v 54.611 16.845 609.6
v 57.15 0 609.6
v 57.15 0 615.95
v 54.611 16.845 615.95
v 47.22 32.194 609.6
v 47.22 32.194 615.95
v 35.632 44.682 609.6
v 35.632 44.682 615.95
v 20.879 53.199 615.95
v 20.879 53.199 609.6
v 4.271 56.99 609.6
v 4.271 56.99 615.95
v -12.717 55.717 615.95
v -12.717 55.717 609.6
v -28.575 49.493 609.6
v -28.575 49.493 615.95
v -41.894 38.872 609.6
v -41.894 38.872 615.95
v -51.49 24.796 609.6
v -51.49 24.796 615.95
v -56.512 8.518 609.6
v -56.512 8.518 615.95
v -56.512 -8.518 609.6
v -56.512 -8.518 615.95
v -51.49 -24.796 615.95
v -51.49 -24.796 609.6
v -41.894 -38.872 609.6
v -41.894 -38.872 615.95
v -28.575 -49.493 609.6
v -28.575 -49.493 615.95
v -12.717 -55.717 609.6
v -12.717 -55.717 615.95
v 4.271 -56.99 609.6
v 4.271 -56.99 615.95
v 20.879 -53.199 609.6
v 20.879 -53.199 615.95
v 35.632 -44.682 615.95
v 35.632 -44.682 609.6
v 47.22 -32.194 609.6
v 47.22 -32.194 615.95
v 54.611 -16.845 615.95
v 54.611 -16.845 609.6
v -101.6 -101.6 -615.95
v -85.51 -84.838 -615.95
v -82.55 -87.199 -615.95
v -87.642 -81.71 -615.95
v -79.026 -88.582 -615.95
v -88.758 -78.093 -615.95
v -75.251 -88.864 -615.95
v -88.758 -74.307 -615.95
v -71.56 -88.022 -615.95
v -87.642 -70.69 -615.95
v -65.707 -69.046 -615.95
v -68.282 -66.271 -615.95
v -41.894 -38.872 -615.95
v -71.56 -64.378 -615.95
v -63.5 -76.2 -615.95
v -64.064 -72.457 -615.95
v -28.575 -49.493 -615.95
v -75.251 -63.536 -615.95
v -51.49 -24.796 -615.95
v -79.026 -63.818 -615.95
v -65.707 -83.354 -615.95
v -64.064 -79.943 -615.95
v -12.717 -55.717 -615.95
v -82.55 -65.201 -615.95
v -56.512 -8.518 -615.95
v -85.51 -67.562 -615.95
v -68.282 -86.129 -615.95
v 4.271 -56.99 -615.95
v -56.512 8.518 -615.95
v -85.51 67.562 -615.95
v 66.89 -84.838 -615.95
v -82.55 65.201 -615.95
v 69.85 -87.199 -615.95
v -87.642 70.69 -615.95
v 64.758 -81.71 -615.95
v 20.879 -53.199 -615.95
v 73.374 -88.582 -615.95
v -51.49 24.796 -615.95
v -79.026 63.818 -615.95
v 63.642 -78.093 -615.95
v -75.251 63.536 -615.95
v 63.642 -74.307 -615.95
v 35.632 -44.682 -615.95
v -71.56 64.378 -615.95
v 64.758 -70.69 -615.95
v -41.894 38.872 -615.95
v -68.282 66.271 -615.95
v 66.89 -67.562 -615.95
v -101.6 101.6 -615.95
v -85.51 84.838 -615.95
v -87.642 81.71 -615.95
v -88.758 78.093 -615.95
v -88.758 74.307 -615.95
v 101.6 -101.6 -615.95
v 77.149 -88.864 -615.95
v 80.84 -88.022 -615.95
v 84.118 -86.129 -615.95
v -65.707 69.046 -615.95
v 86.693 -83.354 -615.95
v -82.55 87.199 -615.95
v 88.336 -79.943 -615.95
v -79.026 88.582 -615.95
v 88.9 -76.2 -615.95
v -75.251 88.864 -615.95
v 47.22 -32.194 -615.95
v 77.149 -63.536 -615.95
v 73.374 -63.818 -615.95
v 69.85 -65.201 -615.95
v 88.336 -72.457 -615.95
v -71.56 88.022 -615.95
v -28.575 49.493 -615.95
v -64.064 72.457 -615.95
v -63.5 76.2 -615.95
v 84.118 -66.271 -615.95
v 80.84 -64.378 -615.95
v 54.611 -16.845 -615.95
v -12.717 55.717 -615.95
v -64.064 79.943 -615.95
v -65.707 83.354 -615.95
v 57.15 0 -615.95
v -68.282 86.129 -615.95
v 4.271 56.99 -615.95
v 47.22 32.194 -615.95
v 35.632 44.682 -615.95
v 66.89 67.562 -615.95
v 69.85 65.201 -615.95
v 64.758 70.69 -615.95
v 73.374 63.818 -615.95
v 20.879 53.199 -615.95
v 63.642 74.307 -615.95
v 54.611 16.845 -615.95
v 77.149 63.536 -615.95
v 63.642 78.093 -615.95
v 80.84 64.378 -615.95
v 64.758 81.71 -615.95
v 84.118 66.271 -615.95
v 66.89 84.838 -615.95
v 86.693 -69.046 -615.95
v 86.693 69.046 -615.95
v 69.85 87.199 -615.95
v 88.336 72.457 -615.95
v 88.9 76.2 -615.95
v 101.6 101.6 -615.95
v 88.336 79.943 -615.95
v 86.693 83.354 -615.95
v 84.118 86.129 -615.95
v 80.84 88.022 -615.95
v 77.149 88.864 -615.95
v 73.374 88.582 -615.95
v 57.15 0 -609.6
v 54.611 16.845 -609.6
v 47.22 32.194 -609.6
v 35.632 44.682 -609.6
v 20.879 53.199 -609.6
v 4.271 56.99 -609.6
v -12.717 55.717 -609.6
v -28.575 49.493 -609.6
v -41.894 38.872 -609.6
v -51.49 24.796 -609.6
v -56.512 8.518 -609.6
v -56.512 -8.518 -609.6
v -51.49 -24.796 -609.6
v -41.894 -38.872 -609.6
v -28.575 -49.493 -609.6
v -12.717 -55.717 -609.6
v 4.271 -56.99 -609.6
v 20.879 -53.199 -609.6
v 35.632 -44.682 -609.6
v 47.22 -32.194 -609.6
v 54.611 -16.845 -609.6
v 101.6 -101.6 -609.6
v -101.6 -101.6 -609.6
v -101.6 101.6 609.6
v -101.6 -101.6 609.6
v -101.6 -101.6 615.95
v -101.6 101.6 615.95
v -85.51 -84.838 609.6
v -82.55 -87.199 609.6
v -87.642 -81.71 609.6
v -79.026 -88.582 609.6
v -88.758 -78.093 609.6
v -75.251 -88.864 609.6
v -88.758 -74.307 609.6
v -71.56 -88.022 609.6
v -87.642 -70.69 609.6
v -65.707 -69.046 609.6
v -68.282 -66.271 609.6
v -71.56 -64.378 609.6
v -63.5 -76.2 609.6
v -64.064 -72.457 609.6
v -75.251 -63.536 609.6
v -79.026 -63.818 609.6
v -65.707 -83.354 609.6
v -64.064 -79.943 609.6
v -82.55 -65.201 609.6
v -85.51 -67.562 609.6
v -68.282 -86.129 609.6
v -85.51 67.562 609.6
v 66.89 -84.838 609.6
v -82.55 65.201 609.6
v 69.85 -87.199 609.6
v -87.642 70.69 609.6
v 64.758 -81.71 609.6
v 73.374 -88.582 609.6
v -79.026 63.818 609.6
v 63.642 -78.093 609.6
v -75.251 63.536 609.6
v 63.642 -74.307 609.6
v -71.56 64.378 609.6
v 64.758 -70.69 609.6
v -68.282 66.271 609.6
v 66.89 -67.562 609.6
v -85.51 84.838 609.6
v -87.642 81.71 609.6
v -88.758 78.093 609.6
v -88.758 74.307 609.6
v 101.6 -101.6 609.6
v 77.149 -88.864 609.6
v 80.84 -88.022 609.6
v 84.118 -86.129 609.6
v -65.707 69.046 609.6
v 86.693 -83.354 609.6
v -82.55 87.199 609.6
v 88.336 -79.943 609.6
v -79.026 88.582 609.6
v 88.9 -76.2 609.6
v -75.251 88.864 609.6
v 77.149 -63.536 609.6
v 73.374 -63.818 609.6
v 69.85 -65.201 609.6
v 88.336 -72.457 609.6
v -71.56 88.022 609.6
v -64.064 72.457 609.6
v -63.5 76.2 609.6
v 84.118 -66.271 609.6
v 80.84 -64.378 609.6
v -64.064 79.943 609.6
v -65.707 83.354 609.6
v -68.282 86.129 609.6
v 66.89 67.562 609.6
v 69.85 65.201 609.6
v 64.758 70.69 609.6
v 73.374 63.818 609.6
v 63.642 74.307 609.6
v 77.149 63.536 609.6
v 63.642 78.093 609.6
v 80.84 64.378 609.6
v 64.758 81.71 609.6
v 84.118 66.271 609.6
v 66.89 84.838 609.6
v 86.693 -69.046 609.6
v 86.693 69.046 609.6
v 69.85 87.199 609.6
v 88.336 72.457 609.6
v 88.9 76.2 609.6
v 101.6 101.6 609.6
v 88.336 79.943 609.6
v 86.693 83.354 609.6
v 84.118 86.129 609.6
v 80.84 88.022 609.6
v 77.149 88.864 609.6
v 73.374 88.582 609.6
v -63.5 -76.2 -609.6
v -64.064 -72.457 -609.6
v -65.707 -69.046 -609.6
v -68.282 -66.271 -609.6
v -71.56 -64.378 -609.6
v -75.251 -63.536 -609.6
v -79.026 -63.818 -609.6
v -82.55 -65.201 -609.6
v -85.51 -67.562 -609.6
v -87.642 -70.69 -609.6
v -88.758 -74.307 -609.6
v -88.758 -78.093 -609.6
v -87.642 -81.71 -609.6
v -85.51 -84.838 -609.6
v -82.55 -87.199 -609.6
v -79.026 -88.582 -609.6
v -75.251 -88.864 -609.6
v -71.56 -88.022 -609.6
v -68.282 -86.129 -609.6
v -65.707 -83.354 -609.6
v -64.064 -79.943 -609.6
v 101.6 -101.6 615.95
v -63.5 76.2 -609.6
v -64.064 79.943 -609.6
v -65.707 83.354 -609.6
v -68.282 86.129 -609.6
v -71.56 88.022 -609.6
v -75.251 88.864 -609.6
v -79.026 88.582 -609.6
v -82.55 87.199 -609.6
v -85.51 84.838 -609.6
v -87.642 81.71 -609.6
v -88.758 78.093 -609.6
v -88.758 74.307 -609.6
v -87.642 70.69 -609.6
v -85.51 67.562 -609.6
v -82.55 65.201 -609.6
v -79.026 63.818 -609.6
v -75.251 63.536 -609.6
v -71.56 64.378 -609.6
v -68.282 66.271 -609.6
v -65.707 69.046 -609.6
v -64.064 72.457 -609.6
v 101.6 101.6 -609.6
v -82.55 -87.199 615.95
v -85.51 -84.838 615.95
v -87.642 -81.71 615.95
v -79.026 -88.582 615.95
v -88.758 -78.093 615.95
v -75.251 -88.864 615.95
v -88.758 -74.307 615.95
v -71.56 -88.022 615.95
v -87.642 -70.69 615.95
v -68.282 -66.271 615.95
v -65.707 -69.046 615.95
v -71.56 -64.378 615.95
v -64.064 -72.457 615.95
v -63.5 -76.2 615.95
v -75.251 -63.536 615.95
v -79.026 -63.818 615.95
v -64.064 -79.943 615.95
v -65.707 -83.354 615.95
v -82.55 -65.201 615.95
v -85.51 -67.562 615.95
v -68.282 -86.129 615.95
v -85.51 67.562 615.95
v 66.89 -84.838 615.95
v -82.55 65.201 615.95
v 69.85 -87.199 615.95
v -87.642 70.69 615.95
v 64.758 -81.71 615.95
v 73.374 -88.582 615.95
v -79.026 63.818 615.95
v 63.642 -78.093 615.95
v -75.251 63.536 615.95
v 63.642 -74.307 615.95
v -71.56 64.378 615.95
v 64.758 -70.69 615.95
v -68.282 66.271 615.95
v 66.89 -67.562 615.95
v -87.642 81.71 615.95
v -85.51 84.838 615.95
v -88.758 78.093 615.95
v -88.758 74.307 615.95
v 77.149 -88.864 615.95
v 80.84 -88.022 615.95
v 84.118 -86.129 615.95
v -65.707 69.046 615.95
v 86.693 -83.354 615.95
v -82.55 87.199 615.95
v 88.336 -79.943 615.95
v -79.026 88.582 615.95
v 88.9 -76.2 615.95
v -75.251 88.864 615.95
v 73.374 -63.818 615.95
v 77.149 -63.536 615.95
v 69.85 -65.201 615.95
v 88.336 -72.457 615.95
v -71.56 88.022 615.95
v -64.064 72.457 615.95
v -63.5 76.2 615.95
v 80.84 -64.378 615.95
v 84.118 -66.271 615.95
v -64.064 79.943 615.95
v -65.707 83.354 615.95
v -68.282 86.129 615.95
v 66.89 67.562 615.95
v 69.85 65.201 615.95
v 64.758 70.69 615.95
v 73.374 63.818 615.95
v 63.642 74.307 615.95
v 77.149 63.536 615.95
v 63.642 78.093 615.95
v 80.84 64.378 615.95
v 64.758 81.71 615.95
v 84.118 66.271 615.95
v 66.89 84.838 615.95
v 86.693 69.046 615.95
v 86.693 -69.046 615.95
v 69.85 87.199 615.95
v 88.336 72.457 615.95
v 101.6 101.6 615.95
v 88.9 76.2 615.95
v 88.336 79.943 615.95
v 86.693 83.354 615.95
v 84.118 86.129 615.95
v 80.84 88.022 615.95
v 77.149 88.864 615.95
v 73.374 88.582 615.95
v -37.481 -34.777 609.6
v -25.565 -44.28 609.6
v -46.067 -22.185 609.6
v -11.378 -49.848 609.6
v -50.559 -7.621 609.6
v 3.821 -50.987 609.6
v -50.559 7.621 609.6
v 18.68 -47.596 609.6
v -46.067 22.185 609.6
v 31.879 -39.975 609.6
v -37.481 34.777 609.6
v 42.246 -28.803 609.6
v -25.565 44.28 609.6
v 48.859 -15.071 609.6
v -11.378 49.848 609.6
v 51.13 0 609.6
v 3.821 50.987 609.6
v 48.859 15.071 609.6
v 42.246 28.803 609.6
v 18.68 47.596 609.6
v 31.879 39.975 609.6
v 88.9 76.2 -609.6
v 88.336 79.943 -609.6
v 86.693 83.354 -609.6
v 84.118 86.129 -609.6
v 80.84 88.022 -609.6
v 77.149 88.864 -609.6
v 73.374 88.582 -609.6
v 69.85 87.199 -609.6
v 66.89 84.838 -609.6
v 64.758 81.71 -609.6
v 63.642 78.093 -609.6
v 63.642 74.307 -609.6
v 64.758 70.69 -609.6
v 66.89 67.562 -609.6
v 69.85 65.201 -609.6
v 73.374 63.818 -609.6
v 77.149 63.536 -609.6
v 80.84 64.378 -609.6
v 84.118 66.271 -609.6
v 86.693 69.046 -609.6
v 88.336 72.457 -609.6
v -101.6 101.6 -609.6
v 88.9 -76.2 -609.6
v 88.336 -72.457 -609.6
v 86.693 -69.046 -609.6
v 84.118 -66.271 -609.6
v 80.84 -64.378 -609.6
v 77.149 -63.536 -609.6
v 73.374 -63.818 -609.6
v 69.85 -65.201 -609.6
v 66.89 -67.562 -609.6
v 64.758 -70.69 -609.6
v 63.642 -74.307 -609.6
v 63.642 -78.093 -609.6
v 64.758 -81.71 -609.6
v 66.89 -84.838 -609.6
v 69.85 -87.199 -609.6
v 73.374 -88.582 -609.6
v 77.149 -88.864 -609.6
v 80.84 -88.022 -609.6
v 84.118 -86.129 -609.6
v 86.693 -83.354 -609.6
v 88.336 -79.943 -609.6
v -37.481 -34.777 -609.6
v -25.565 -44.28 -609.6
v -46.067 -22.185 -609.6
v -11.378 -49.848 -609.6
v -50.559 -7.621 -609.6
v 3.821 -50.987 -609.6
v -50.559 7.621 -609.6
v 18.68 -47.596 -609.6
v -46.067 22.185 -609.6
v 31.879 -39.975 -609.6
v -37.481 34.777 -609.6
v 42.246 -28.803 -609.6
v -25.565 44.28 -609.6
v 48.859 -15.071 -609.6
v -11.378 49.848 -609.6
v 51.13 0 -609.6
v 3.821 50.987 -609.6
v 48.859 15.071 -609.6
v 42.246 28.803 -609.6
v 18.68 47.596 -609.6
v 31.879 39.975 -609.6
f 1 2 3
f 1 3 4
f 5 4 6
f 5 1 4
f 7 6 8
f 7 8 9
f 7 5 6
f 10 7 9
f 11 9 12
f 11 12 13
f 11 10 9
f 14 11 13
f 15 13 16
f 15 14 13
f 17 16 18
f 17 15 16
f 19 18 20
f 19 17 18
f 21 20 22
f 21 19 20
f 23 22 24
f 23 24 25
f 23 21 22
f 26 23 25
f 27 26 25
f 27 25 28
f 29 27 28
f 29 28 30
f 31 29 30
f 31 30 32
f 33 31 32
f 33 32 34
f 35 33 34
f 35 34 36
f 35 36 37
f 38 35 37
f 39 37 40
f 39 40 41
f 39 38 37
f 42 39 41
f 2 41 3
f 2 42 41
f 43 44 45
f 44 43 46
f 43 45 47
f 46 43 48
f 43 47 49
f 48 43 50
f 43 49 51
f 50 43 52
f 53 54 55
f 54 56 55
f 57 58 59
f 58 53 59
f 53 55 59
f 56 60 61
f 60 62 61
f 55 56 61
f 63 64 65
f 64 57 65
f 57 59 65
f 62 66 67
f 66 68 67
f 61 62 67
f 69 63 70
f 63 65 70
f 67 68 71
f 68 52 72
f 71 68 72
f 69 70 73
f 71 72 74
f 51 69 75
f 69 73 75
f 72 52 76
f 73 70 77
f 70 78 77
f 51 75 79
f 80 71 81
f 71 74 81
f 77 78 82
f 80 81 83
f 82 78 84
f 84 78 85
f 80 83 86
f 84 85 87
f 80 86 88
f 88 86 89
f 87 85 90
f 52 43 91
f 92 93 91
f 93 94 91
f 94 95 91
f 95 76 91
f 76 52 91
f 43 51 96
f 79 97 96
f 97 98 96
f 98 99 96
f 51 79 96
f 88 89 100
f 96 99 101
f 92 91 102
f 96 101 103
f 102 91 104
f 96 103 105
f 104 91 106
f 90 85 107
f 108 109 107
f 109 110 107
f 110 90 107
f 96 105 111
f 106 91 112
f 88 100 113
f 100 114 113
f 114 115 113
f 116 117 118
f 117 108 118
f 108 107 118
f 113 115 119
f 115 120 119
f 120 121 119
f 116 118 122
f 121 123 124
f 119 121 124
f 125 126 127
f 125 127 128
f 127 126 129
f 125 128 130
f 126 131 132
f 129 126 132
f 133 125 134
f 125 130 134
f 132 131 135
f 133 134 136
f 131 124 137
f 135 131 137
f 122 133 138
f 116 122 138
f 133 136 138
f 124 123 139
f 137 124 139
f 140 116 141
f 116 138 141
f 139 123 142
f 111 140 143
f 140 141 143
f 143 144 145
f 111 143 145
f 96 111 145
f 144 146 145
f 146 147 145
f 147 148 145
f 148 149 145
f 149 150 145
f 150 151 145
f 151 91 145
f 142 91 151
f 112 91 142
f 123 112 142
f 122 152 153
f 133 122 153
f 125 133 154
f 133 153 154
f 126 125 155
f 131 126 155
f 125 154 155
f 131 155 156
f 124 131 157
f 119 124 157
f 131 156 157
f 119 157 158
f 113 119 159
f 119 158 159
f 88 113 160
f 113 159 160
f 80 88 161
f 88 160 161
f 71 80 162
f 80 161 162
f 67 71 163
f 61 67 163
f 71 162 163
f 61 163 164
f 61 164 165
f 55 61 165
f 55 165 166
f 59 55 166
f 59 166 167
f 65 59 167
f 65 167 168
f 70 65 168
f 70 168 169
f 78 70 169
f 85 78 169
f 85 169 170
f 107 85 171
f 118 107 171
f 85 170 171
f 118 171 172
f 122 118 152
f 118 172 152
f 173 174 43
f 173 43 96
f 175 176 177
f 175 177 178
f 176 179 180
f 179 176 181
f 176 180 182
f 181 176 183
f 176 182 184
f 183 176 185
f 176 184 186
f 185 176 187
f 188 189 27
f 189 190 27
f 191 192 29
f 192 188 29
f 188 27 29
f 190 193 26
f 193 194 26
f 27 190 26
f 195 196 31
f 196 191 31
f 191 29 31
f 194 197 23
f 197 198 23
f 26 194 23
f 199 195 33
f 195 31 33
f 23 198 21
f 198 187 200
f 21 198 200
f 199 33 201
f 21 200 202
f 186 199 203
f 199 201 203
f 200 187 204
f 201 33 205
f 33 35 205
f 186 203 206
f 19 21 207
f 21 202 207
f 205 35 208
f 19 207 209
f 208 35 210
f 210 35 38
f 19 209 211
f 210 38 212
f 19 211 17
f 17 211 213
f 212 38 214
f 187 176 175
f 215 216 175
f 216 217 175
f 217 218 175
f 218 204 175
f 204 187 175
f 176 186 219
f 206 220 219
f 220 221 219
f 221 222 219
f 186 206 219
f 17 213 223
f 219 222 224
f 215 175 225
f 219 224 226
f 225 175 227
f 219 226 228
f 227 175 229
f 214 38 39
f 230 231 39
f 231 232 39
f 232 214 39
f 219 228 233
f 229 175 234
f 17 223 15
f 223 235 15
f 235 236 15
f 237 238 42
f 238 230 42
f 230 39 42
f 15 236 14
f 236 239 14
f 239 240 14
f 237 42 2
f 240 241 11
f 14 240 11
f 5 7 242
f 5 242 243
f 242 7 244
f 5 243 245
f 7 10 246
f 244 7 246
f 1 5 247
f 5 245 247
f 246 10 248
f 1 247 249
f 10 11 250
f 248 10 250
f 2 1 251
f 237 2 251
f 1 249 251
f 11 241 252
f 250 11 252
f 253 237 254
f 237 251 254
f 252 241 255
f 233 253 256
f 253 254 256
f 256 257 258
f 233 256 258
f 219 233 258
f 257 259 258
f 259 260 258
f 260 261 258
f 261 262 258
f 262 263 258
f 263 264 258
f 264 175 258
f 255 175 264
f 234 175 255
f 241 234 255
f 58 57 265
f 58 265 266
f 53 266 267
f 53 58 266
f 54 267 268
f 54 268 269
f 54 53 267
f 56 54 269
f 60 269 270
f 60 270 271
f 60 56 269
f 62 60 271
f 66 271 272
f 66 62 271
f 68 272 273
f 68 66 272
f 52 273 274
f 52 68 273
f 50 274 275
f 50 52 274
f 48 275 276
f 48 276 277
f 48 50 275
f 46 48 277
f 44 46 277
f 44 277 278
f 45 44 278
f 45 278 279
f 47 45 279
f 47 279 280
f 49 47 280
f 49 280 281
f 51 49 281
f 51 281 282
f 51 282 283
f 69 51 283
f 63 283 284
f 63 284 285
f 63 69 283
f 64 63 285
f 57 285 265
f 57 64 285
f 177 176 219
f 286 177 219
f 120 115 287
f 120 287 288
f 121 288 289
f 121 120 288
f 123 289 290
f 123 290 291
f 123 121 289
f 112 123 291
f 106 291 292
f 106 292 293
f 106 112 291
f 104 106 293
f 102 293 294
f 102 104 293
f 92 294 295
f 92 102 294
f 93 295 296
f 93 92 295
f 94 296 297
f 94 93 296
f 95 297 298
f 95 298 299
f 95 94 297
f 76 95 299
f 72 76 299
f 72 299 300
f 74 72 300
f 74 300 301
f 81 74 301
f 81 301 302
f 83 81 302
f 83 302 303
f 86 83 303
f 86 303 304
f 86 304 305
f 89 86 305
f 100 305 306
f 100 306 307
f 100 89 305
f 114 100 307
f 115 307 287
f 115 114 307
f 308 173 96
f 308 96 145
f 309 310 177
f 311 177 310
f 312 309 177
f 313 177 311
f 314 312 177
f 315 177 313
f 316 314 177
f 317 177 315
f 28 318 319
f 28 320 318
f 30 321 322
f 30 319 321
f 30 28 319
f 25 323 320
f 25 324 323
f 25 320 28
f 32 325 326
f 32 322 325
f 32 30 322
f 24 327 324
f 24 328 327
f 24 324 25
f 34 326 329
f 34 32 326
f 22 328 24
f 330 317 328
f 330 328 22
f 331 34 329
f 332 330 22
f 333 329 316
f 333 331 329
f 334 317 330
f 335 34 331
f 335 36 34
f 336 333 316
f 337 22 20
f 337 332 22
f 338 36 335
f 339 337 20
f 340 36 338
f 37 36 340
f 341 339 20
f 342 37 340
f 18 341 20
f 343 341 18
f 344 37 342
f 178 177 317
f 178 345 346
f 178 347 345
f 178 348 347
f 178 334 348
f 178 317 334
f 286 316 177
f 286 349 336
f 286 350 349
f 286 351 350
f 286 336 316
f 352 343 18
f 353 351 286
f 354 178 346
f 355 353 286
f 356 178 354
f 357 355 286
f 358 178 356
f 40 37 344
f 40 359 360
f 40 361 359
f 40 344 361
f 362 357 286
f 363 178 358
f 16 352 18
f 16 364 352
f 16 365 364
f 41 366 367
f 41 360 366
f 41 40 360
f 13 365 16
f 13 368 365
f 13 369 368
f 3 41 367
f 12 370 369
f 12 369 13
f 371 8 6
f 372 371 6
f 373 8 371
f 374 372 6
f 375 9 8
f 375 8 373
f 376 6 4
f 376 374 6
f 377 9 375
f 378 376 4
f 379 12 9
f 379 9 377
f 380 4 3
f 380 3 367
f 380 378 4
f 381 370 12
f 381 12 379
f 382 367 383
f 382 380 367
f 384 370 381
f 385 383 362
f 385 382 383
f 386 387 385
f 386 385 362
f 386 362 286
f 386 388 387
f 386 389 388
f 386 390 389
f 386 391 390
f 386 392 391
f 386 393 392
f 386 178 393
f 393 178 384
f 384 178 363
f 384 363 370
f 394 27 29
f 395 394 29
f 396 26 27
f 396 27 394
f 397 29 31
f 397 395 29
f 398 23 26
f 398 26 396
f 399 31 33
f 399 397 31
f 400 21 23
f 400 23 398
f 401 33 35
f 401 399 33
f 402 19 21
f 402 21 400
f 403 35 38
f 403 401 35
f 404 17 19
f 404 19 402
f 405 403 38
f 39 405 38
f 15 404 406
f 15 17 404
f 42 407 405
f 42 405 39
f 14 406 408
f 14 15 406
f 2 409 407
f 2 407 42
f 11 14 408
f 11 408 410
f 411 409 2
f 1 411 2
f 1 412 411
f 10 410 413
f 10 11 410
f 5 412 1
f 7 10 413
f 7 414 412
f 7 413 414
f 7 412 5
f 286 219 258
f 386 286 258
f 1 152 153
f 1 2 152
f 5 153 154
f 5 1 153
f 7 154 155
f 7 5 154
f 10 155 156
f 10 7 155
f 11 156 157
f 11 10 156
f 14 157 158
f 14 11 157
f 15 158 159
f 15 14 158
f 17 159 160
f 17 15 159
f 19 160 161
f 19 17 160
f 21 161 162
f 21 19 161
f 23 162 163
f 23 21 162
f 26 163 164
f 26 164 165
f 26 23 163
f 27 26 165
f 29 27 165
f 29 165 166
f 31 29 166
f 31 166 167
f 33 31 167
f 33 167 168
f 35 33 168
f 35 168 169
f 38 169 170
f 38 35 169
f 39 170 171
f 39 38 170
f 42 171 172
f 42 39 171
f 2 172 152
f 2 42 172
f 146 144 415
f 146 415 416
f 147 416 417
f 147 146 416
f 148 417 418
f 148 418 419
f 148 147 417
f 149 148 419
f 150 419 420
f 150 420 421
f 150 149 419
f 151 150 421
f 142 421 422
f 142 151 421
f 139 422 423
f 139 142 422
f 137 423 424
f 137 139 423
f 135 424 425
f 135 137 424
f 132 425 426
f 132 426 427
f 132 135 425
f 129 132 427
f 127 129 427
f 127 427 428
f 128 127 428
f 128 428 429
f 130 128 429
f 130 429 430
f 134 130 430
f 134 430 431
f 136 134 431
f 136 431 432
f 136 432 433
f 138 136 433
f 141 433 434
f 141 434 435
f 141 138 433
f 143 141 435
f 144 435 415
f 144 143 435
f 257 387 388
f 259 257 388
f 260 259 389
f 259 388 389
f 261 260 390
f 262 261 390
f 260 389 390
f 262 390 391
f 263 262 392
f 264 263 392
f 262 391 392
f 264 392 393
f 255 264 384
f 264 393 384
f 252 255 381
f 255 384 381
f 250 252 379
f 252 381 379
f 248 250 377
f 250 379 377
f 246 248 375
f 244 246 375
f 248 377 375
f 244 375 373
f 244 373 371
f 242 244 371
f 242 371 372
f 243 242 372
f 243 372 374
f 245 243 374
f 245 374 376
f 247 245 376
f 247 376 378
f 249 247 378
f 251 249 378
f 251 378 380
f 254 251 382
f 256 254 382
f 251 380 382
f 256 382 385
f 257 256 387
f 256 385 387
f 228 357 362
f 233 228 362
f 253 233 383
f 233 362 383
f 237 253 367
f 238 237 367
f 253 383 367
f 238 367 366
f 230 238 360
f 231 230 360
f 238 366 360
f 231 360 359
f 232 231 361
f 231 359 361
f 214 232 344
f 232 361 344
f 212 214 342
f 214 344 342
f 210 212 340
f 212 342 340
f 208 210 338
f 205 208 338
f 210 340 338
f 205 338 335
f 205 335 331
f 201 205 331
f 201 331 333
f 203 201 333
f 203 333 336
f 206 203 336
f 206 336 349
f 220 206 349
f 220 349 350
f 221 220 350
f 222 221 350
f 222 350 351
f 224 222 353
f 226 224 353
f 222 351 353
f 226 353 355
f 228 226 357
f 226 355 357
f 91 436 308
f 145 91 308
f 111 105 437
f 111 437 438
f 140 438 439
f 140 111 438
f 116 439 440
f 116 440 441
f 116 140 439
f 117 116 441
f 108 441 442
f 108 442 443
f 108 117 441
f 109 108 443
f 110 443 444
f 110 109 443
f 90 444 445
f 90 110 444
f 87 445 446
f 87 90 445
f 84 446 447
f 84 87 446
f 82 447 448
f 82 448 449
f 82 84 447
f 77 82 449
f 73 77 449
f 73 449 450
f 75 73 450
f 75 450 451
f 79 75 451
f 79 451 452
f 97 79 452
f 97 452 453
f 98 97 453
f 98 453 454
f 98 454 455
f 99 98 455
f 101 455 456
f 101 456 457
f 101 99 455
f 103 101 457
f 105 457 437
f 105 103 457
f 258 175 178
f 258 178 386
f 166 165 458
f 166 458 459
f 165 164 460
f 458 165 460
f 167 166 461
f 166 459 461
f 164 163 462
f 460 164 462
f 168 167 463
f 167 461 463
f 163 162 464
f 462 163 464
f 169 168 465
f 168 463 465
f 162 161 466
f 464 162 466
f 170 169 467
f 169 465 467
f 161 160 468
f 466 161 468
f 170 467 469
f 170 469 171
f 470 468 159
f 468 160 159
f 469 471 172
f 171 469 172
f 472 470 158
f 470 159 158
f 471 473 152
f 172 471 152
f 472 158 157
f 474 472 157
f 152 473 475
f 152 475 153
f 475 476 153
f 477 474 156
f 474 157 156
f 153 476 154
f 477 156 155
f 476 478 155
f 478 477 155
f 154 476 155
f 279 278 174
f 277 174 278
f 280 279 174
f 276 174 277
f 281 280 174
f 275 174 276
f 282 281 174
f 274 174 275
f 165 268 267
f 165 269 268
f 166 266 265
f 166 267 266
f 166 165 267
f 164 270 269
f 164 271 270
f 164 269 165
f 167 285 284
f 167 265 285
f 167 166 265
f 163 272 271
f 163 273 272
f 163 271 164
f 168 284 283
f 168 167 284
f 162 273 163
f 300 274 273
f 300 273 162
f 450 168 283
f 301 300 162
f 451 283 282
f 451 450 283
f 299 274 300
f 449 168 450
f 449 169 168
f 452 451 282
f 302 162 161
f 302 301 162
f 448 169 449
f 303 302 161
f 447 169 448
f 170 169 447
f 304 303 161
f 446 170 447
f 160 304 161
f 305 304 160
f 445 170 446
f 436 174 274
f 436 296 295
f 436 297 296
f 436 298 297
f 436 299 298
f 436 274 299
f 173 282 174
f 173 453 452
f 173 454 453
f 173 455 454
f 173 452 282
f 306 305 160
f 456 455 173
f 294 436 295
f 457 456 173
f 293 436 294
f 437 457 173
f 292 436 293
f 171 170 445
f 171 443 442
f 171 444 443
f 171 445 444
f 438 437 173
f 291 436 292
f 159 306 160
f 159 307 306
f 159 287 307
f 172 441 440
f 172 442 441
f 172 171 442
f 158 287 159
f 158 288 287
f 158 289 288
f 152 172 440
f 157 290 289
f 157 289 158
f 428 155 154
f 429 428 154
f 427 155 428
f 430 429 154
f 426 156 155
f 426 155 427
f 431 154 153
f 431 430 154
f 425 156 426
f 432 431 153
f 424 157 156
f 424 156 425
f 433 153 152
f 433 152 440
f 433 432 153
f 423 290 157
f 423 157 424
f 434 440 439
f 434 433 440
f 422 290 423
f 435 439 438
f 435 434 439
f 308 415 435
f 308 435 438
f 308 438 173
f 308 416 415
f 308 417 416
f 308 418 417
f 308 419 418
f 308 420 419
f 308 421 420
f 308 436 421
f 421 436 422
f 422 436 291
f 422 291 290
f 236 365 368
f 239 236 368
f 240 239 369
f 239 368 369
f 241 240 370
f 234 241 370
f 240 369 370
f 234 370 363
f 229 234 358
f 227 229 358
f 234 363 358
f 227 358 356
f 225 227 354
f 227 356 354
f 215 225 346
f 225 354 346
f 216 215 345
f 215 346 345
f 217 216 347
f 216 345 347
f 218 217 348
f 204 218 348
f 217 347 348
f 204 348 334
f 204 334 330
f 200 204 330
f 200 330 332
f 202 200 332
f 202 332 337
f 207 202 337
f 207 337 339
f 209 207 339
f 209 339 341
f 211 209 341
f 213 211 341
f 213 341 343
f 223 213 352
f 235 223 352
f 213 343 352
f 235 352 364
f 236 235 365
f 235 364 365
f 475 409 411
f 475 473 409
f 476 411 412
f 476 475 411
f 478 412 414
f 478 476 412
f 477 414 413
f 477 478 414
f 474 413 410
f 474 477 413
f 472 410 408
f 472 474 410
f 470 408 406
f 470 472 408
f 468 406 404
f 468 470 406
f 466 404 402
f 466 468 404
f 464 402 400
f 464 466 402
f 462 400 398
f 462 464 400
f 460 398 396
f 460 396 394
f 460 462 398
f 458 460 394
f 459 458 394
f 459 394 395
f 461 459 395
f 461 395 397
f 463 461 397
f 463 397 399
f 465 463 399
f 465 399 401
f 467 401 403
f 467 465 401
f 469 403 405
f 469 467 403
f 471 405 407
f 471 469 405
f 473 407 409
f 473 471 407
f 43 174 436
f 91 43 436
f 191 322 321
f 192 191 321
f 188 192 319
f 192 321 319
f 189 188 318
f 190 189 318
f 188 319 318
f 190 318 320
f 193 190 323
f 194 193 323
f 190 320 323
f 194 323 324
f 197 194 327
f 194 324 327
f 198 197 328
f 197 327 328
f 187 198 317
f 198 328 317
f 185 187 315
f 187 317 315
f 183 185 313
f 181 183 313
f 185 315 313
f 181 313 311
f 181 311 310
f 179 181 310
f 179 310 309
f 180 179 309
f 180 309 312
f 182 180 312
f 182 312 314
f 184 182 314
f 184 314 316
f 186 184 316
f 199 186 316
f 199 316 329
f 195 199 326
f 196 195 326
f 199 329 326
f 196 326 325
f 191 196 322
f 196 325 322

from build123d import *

# Parameters (mm, degrees)
F0_R     = 57.15
F0_R_2   = 51.1302
F1_DEPTH = 609.6
F2_W     = 203.2
F2_H     = 203.2
F2_R     = 57.15
F3_DEPTH = 6.35
F4_R     = 12.7
F5_DEPTH = 6.35


with BuildPart() as f1:
    # F0 (on Top) → F1 (new body, symmetric)
    with BuildSketch(Plane.XY):
        Circle(F0_R)
        Circle(F0_R_2, mode=Mode.SUBTRACT)
    extrude(amount=F1_DEPTH, both=True)


with BuildPart() as f3:
    # F2 (on face) → F3 (new body)
    with BuildSketch(Plane.XY.offset(609.6)):
        Rectangle(F2_W, F2_H)
        Circle(F2_R, mode=Mode.SUBTRACT)
    extrude(amount=F3_DEPTH)

    # F4 (on face) → F5 (cut, through all)
    with BuildSketch(Plane.XY.offset(615.95)):
        with Locations((-76.2, 76.2)):
            Circle(F4_R)
        with Locations((76.2, 76.2)):
            Circle(F4_R)
        with Locations((-76.2, -76.2)):
            Circle(F4_R)
        with Locations((76.2, -76.2)):
            Circle(F4_R)
    extrude(amount=-F5_DEPTH, mode=Mode.SUBTRACT)


with BuildPart() as f6_1:
    # F6: instance of F3
    add(f3.part.mirror(Plane.XY))


solid = Compound([f1.part, f3.part, f6_1.part])
